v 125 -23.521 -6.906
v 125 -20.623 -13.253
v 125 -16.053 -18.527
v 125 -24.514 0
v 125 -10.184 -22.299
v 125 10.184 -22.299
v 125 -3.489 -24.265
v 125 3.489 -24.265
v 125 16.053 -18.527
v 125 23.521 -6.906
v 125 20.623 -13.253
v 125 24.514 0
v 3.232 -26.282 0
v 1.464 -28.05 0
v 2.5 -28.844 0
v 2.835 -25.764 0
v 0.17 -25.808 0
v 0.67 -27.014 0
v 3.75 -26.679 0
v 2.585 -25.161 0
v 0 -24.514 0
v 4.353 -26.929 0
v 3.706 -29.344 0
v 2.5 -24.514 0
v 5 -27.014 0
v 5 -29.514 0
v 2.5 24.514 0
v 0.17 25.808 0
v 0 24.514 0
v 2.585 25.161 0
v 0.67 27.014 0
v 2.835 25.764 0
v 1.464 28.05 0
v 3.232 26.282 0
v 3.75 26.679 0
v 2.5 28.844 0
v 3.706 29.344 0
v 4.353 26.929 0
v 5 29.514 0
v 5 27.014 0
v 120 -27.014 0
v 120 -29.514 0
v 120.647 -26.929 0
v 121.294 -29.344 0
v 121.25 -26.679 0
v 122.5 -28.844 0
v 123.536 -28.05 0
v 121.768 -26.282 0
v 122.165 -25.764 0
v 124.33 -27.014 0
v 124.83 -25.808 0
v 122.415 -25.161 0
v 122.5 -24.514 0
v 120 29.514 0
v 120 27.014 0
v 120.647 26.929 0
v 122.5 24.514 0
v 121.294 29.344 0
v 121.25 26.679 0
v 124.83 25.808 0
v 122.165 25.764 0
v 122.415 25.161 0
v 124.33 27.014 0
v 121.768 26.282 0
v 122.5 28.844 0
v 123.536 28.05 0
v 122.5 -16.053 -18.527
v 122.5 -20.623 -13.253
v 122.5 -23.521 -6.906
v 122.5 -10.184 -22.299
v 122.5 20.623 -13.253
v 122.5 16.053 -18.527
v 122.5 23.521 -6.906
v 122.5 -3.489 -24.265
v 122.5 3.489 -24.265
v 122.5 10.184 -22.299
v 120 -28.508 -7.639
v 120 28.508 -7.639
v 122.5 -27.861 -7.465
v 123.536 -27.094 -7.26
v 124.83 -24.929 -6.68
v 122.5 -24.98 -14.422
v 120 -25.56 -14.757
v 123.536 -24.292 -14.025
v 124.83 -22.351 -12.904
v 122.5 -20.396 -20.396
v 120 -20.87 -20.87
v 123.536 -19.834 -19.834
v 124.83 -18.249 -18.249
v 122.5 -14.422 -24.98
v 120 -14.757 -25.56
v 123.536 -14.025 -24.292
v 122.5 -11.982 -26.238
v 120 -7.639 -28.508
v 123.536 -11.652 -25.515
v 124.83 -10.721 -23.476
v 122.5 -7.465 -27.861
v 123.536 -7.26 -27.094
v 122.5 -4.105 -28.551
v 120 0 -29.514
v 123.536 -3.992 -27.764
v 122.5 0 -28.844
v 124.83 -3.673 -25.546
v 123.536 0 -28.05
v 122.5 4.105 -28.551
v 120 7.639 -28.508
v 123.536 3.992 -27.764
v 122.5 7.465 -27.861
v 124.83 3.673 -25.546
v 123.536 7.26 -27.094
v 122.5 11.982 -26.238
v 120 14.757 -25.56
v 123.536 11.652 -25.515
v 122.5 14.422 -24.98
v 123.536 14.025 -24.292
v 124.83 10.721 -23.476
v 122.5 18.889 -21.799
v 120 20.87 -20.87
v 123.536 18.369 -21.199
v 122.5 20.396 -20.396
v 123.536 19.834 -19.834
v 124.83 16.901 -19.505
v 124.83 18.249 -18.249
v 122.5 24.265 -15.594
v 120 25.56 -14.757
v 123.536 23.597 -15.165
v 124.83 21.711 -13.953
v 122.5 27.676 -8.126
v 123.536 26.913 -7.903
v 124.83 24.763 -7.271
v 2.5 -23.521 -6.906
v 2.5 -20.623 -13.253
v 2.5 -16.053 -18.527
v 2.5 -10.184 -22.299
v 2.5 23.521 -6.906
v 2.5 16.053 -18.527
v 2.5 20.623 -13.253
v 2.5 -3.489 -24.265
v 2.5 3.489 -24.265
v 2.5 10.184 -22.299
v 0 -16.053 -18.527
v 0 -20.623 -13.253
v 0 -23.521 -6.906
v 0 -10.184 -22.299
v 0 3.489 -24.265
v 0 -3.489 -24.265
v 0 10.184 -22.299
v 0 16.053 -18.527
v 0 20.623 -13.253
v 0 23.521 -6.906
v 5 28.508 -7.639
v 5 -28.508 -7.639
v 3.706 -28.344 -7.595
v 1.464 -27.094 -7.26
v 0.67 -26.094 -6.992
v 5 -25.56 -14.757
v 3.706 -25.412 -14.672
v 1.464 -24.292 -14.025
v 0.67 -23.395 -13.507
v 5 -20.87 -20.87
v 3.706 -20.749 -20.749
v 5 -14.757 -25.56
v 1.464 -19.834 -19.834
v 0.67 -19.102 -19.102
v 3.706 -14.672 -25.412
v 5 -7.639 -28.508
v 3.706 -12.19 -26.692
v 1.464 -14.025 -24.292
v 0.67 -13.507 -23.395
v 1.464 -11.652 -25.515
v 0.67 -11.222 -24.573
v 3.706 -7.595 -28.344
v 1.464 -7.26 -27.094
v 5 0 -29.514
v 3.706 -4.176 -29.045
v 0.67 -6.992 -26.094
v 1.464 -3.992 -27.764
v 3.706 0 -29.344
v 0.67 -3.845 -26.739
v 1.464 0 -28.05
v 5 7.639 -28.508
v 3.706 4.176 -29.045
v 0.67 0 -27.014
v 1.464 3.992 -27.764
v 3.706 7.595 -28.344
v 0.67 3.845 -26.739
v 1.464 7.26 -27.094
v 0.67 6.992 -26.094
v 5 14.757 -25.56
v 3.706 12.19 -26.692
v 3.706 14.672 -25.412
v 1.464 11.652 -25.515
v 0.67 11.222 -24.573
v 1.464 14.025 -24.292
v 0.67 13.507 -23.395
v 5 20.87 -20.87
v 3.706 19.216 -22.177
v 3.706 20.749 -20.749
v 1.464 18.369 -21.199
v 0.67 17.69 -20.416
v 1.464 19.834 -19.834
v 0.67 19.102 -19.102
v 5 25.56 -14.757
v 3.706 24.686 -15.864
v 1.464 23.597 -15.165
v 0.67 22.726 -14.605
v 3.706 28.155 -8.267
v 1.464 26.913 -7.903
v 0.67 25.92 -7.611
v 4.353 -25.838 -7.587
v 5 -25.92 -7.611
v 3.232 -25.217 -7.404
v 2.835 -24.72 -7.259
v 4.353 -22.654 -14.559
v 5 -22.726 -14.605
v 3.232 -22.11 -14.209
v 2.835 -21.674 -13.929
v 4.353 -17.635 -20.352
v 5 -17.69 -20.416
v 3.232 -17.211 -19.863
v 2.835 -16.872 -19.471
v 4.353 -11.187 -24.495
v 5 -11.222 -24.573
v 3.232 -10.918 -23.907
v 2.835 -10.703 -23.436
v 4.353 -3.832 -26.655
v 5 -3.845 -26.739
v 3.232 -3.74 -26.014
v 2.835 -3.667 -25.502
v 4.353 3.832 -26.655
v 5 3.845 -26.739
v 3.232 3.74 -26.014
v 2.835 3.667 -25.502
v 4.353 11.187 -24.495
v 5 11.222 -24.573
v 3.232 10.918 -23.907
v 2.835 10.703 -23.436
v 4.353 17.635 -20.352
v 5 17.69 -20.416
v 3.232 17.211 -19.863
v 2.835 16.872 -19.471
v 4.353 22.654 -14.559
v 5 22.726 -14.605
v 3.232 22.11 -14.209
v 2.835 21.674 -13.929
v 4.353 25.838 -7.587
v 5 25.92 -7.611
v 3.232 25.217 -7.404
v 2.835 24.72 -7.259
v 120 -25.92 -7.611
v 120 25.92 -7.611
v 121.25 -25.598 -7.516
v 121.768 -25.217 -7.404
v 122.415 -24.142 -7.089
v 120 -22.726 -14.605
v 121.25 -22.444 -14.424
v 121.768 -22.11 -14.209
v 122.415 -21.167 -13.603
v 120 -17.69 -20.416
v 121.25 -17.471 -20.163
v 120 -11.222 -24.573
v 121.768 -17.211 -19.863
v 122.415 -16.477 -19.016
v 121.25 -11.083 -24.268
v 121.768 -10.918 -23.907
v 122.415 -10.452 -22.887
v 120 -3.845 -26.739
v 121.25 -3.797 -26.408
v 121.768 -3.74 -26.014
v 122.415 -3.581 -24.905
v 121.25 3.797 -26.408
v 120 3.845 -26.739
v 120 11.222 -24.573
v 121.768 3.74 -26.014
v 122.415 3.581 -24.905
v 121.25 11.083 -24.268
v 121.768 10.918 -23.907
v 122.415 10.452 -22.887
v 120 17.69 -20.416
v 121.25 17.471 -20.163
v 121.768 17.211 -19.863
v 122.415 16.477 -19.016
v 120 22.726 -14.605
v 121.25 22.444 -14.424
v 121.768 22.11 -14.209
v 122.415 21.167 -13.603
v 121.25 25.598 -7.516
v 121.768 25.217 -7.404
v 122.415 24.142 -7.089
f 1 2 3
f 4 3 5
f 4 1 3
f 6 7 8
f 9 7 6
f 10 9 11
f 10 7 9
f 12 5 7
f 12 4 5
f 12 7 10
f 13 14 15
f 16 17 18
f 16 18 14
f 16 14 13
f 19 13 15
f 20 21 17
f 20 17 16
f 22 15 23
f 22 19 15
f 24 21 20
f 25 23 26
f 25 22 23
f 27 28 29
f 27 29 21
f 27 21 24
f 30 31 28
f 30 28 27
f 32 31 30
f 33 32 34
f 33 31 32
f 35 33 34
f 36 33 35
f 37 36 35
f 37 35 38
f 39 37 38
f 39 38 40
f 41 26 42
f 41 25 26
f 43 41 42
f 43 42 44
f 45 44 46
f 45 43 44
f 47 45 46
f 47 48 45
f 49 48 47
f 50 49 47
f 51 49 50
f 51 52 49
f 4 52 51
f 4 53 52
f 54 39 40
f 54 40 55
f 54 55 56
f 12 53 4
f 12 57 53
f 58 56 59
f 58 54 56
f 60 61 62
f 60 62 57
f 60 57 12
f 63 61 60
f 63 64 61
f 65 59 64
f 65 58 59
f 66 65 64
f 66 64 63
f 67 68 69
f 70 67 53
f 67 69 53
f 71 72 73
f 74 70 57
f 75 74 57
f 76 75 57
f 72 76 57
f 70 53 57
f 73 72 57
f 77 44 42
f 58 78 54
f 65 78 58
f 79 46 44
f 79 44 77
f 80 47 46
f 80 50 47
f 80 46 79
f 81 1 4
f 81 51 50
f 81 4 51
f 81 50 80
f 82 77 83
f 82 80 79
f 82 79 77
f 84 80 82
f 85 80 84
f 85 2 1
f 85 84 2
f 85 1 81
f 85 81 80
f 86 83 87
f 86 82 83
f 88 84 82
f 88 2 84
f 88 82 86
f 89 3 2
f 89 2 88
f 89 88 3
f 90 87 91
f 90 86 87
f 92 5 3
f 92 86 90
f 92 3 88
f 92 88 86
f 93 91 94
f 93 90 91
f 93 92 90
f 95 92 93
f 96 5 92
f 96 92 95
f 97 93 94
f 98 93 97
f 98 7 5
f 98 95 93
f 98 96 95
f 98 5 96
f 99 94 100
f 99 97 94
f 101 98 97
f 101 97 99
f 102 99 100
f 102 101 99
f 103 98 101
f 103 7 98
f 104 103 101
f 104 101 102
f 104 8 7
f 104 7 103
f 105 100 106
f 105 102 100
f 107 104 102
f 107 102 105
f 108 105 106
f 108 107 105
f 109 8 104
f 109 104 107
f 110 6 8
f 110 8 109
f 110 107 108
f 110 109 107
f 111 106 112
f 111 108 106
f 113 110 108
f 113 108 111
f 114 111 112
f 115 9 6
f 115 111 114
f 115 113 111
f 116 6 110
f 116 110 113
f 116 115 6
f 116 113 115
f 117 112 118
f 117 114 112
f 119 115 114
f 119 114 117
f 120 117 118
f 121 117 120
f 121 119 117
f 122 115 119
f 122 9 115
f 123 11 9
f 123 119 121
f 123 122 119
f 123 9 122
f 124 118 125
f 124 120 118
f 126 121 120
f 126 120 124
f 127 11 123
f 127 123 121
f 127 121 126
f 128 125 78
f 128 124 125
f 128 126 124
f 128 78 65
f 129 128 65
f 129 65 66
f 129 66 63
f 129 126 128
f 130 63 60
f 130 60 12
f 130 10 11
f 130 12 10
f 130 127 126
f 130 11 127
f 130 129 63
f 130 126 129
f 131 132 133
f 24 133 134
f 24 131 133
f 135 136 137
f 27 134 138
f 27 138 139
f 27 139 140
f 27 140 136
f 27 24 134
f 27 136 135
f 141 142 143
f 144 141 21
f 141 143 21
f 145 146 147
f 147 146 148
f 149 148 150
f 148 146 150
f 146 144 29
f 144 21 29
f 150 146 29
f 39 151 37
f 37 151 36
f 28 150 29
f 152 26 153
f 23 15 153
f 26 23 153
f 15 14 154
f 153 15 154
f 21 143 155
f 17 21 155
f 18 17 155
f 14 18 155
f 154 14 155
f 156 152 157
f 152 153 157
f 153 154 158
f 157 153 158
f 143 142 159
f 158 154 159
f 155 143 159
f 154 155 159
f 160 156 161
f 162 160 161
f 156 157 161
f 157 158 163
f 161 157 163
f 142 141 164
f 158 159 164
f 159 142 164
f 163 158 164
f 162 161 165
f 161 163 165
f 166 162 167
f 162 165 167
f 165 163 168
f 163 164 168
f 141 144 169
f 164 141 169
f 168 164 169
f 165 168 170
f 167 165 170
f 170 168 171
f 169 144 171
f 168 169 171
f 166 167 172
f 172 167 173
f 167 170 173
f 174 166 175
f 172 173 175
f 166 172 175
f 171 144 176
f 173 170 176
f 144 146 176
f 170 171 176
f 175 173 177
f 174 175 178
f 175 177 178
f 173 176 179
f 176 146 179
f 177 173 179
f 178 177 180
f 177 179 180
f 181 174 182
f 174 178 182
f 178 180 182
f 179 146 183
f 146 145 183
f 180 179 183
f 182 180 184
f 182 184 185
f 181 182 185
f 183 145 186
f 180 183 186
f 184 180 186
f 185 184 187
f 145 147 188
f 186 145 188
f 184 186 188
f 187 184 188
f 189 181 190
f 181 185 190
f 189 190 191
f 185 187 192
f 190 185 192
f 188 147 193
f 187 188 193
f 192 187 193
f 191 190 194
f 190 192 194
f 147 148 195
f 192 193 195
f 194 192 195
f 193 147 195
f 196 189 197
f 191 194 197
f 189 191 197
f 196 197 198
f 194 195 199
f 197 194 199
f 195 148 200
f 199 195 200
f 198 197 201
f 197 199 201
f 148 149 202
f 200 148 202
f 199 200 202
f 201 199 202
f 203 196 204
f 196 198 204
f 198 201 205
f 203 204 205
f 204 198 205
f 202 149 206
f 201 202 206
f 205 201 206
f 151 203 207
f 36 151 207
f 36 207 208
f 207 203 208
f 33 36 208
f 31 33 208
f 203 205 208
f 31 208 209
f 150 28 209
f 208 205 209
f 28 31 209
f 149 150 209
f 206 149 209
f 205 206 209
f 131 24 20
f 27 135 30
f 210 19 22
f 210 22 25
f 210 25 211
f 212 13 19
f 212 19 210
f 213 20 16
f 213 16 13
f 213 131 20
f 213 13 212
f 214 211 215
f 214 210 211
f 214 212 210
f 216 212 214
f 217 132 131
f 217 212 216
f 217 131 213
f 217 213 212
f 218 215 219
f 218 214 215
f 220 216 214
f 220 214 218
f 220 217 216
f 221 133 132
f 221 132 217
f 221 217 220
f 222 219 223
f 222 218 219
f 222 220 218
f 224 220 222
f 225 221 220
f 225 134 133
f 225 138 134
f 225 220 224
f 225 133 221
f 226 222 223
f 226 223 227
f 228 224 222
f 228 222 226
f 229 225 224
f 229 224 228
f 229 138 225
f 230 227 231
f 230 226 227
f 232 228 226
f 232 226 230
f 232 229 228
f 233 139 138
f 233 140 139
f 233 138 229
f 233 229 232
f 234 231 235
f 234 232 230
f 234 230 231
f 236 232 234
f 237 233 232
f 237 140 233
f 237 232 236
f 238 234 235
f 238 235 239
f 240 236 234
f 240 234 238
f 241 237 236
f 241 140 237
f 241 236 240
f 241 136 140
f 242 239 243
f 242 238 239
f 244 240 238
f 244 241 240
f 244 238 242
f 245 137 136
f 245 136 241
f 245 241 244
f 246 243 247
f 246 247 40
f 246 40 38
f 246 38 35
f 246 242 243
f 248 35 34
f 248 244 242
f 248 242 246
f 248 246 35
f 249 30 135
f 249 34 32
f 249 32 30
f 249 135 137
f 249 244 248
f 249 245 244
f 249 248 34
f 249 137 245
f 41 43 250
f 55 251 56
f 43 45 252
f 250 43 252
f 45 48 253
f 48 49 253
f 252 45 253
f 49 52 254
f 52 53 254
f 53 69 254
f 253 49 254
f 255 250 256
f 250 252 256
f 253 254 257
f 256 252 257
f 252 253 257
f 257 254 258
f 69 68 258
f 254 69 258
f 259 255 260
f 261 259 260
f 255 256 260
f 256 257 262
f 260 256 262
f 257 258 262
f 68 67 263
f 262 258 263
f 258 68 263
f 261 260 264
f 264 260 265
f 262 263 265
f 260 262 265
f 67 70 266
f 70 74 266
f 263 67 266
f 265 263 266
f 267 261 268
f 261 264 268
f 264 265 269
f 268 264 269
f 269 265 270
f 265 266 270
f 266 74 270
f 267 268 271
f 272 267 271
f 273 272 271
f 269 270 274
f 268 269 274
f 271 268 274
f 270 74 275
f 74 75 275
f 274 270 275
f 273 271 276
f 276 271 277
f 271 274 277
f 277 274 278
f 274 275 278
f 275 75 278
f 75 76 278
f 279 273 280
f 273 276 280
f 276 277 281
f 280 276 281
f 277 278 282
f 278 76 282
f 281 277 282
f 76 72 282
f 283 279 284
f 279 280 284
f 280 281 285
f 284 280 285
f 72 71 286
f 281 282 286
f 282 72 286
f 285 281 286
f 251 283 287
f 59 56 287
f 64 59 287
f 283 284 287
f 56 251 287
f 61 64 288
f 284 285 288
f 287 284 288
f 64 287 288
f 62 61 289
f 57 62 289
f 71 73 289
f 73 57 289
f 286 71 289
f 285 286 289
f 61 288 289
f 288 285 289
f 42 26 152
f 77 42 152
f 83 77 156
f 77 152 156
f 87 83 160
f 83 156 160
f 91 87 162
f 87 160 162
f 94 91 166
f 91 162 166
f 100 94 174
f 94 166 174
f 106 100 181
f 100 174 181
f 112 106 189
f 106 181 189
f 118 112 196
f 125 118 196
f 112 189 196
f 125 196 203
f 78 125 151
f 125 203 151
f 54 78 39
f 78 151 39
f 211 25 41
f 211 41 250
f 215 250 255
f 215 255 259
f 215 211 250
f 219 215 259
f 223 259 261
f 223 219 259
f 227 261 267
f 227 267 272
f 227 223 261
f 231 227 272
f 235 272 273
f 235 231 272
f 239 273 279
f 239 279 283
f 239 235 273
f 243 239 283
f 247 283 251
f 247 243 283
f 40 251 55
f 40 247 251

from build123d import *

# Parameters (mm, degrees)
F0_R     = 29.5141239903
F1_DEPTH = 125
F2_R     = 5
F3_W     = 373.883869499
F3_H     = 179.5099824667
F4_DEPTH = 29.5151239903
F5_T     = -2.5


with BuildPart() as f1:
    # F0 (on Right) → F1 (new body)
    with BuildSketch(Plane.YZ):
        Circle(F0_R)
    extrude(amount=F1_DEPTH)

    # F2
    f2_edges = [f1.edges().sort_by_distance(p)[0] for p in [
        (0, -29.514124, 0),
        (125, -29.514124, 0),
    ]]
    fillet(f2_edges, radius=F2_R)

    # F3 (on Top) → F4 (cut, through all)
    with BuildSketch(Plane.XY):
        with Locations((-27.8811287135, 41.5856614709)):
            Rectangle(F3_W, F3_H)
    extrude(amount=F4_DEPTH, mode=Mode.SUBTRACT)

    # F5
    f5_openings = [f1.faces().sort_by_distance(p)[0] for p in [
        (62.5, 0, 0),
    ]]
    offset(amount=F5_T, openings=f5_openings)


solid = f1.part
